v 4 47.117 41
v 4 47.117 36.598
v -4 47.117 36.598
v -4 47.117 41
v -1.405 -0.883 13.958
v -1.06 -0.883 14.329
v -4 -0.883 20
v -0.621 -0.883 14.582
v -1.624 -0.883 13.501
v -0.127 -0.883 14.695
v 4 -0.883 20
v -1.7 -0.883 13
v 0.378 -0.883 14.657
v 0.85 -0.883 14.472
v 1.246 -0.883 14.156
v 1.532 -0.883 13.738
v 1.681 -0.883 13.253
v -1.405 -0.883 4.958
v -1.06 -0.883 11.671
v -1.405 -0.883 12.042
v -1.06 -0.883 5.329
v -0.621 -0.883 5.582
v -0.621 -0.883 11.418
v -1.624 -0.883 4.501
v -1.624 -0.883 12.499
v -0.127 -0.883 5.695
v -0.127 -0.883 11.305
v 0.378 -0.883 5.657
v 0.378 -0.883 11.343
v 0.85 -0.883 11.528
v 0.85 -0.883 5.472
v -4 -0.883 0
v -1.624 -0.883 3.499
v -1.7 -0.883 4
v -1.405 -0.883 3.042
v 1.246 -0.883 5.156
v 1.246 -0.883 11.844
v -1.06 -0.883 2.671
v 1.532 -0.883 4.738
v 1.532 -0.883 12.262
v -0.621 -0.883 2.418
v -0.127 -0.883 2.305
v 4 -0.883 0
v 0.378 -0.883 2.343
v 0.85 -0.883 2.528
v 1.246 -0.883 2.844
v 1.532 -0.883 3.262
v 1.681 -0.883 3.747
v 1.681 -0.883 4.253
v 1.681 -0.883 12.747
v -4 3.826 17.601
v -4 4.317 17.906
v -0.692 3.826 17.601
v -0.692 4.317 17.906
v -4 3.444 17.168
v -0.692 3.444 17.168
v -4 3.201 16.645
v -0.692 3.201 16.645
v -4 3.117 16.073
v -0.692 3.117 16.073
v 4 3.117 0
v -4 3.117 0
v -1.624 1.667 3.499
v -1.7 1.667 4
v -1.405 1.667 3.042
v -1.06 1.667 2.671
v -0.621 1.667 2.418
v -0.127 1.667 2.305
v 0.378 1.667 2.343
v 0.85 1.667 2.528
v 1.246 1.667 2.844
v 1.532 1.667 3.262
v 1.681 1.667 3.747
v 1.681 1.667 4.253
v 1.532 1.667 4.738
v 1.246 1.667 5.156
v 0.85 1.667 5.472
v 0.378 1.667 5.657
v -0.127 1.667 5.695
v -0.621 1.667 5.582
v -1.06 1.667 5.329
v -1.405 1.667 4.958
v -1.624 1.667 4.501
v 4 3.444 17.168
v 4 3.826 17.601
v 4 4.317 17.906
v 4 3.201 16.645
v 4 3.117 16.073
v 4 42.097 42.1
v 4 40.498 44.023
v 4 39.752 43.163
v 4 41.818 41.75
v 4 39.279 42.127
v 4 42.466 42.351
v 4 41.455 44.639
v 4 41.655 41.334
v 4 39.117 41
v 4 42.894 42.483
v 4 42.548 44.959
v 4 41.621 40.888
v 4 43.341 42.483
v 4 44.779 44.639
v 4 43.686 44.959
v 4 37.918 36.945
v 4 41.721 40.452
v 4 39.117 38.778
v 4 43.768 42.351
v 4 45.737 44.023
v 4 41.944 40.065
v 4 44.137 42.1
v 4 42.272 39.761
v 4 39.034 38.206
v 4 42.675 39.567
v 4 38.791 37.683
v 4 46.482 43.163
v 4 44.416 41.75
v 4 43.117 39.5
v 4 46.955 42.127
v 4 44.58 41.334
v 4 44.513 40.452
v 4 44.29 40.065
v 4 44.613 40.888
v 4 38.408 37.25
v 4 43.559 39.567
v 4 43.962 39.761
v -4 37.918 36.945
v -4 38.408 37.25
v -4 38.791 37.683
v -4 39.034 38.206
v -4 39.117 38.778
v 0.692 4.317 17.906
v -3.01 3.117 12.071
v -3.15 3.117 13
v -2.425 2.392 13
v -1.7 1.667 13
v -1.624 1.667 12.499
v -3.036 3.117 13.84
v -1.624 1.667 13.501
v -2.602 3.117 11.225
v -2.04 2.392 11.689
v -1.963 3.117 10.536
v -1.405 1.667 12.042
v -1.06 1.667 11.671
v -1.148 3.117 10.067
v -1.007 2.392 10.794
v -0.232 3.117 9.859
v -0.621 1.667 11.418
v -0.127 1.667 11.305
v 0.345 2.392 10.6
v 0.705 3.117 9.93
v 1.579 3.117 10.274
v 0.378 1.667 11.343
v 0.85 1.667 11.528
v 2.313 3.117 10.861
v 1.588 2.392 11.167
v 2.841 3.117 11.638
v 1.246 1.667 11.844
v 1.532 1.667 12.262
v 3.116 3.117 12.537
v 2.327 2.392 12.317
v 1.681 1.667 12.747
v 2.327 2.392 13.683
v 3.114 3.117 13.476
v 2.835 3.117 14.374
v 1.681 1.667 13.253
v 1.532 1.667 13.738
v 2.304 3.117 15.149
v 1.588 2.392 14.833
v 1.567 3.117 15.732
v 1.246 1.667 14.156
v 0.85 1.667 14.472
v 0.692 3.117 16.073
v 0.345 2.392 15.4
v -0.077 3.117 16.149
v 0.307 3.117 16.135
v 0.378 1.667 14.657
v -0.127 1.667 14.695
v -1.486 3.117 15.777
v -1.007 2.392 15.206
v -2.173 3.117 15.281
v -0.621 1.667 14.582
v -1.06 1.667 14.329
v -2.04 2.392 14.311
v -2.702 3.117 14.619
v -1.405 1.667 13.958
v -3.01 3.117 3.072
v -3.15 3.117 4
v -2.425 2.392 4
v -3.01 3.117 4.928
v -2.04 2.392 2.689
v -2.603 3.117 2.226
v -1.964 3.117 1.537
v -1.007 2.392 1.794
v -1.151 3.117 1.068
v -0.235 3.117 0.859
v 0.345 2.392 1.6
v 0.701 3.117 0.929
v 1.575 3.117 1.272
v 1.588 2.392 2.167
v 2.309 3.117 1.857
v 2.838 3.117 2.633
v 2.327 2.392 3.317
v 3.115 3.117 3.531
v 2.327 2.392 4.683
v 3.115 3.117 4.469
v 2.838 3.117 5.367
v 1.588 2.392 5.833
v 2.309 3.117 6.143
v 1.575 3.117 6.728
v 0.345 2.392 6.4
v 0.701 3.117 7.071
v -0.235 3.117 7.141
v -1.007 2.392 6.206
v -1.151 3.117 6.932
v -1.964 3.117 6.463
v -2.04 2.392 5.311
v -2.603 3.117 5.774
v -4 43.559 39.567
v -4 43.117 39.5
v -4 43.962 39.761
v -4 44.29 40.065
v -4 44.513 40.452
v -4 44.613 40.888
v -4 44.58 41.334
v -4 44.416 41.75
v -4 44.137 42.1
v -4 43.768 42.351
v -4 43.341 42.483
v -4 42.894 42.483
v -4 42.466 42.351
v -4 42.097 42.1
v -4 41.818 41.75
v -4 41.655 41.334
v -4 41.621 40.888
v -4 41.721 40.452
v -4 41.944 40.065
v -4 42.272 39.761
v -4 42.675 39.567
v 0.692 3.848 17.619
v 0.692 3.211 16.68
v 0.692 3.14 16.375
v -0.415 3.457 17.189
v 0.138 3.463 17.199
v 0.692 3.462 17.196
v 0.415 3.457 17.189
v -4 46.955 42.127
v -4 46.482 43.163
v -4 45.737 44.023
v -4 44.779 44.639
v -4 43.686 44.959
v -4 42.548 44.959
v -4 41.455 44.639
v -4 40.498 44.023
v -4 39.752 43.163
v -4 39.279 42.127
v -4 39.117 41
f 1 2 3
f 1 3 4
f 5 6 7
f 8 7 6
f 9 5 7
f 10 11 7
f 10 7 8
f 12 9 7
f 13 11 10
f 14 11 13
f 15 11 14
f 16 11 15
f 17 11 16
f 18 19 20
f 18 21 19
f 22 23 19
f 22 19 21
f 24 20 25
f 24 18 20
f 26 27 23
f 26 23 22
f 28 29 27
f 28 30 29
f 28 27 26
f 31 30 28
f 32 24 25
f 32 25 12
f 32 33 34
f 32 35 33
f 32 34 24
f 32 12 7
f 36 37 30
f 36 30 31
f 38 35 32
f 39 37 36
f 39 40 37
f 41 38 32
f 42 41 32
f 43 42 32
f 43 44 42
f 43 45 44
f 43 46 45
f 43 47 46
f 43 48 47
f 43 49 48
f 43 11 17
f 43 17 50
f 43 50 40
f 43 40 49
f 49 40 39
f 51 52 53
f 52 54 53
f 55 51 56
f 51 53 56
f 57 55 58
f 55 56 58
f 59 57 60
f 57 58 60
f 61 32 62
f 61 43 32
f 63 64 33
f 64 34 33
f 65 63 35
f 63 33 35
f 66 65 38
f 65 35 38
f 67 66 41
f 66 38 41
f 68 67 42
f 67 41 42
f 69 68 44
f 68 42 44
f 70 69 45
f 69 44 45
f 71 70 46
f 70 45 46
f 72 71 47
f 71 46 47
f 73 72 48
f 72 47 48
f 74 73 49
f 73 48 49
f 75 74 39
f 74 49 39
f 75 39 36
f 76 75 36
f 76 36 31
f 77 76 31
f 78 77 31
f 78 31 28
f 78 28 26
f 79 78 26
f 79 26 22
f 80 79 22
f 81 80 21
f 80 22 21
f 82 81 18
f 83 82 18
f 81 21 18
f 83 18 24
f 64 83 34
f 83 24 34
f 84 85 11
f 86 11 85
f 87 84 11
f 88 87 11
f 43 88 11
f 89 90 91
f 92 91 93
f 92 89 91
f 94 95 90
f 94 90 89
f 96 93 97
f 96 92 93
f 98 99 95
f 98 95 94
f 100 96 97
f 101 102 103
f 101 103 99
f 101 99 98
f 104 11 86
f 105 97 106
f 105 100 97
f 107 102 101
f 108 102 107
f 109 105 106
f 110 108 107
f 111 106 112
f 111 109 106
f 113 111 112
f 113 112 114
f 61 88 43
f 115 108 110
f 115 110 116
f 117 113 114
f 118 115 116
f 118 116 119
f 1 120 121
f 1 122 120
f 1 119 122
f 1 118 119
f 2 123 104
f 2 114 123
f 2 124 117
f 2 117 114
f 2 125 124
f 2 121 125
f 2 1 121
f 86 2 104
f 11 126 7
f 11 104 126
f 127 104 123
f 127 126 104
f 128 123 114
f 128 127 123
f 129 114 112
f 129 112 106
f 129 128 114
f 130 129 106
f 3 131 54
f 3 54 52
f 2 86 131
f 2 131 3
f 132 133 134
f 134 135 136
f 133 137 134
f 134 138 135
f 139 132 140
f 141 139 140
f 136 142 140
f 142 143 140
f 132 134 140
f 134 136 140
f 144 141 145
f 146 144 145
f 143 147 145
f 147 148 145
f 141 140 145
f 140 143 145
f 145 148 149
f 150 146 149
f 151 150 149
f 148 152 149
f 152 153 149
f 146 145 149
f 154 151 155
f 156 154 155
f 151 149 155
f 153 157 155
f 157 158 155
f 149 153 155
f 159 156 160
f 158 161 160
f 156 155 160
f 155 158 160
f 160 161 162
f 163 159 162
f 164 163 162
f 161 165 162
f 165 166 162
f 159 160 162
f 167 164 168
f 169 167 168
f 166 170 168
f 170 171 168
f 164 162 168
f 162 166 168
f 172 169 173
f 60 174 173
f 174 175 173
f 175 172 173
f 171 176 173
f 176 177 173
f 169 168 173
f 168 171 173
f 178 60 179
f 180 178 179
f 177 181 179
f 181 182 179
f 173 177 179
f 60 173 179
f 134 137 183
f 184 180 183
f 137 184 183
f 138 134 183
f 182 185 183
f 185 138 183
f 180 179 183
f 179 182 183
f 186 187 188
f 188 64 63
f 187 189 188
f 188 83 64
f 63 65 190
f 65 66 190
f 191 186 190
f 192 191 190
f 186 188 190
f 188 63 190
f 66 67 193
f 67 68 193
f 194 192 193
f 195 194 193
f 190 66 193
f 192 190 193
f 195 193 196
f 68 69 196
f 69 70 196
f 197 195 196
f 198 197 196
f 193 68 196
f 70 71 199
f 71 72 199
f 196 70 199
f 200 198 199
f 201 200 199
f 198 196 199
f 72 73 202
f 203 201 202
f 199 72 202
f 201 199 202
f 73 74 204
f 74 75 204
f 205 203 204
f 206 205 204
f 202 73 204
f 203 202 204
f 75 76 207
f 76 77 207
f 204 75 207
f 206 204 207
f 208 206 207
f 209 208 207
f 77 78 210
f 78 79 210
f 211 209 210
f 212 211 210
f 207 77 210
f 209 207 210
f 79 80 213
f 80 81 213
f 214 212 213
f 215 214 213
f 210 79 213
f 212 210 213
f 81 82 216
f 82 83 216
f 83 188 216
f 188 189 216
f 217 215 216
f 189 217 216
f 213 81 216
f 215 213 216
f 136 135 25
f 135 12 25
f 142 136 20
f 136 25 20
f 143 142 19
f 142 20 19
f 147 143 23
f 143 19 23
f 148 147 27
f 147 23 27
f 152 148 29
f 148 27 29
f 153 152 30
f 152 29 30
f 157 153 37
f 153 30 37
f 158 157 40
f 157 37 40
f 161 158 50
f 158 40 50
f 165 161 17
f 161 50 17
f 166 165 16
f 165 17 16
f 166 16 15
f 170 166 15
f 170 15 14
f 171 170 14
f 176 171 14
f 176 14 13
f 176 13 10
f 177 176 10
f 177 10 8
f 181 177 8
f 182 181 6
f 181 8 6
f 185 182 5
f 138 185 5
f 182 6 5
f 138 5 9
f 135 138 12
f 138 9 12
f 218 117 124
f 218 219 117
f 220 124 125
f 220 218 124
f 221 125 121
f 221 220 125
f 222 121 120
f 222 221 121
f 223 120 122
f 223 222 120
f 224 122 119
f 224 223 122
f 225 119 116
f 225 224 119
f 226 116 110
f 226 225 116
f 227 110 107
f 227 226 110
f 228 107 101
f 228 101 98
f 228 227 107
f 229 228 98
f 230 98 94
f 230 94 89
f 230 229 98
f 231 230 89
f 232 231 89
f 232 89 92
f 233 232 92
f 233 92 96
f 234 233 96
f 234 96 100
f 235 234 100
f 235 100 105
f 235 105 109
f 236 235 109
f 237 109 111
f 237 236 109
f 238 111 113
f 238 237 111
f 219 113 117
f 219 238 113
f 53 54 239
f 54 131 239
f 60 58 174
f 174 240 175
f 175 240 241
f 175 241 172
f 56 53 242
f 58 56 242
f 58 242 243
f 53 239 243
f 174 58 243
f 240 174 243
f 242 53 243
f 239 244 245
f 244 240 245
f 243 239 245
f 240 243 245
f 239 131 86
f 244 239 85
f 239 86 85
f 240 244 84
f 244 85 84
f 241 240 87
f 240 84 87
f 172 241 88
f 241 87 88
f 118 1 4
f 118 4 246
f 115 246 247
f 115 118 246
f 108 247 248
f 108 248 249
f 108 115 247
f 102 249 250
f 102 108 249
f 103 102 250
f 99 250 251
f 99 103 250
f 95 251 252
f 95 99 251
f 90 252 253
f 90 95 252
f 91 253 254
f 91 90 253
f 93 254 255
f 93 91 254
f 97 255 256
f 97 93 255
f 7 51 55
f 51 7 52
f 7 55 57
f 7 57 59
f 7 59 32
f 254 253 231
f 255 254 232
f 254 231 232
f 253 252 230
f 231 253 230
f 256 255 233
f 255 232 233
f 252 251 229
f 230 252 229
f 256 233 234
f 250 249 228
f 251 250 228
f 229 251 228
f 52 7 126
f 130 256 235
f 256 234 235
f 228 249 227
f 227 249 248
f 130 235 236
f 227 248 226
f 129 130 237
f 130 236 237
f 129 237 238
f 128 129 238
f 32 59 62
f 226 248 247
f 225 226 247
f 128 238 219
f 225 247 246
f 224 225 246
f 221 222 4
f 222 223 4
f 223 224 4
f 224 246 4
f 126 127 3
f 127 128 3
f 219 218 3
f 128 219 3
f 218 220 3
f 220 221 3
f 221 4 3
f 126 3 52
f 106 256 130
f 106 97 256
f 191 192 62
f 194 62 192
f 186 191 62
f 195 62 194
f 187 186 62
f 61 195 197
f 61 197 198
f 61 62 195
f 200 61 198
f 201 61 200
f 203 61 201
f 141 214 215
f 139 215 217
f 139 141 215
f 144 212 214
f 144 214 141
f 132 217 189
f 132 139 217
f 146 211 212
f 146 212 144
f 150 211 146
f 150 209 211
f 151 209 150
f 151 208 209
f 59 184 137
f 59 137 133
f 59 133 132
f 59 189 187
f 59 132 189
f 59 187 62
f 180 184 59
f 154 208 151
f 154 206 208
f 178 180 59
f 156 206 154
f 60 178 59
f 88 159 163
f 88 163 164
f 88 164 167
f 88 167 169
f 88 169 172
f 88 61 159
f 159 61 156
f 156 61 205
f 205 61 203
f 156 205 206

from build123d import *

# Parameters (mm, degrees)
SKETCH1_R                                       = 1.5
BOSS_EXTRUDE1_DEPTH                             = 4
CSK_FOR_M3_FLAT_HEAD_MACHINE_SCREW1_D           = 3.4
CSK_FOR_M3_FLAT_HEAD_MACHINE_SCREW1_DEPTH       = 7.5
CSK_FOR_M3_FLAT_HEAD_MACHINE_SCREW1_CSINK_D     = 6.3
CSK_FOR_M3_FLAT_HEAD_MACHINE_SCREW1_CSINK_ANGLE = 90
CSK_FOR_M3_FLAT_HEAD_MACHINE_SCREW1_TIP         = 1.021463052
FILLET1_R                                       = 2


with BuildPart() as part:
    # Sketch1 → Boss-Extrude1 (new body, symmetric)
    with BuildSketch(Plane(origin=(0, 0, 0), x_dir=(0, 0, -1), z_dir=(1, 0, 0))):
        with BuildLine():
            Line((0, -0.882843337), (0, 0))
            Line((0, 0), (0, 3.117156663))
            Line((0, 3.117156663), (-17.3820744, 3.117156663))
            Line((-17.3820744, 3.117156663), (-36.597884255, 47.117156663))
            Line((-36.597884255, 47.117156663), (-41, 47.117156663))
            ThreePointArc((-41, 47.117156663), (-45, 43.117156663), (-41, 39.117156663))
            Line((-41, 39.117156663), (-37.46891805, 39.117156663))
            Line((-37.46891805, 39.117156663), (-20, -0.882843337))
            Line((-20, -0.882843337), (0, -0.882843337))
        make_face()
        with Locations((-41, 43.117156663)):
            Circle(SKETCH1_R, mode=Mode.SUBTRACT)
    extrude(amount=BOSS_EXTRUDE1_DEPTH, both=True)

    # CSK for M3 Flat Head Machine Screw1
    with Locations(Plane(origin=(0, 3.117156663, 0), x_dir=(1, 0, 0), z_dir=(0, 1, 0))):
        with Locations((0, -13), (0, -4)):
            CounterSinkHole(CSK_FOR_M3_FLAT_HEAD_MACHINE_SCREW1_D / 2, CSK_FOR_M3_FLAT_HEAD_MACHINE_SCREW1_CSINK_D / 2, depth=CSK_FOR_M3_FLAT_HEAD_MACHINE_SCREW1_DEPTH, counter_sink_angle=CSK_FOR_M3_FLAT_HEAD_MACHINE_SCREW1_CSINK_ANGLE)
            with Locations((0, 0, -(CSK_FOR_M3_FLAT_HEAD_MACHINE_SCREW1_DEPTH + CSK_FOR_M3_FLAT_HEAD_MACHINE_SCREW1_TIP / 2))):  # 118° drill point
                Cone(0, CSK_FOR_M3_FLAT_HEAD_MACHINE_SCREW1_D / 2, CSK_FOR_M3_FLAT_HEAD_MACHINE_SCREW1_TIP, mode=Mode.SUBTRACT)

    # Fillet1
    fillet1_edges = [part.edges().sort_by_distance(p)[0] for p in [
        (0, 3.117156663, 17.3820744),
        (0, 39.117156663, 37.46891805),
    ]]
    fillet(fillet1_edges, radius=FILLET1_R)


solid = part.part
